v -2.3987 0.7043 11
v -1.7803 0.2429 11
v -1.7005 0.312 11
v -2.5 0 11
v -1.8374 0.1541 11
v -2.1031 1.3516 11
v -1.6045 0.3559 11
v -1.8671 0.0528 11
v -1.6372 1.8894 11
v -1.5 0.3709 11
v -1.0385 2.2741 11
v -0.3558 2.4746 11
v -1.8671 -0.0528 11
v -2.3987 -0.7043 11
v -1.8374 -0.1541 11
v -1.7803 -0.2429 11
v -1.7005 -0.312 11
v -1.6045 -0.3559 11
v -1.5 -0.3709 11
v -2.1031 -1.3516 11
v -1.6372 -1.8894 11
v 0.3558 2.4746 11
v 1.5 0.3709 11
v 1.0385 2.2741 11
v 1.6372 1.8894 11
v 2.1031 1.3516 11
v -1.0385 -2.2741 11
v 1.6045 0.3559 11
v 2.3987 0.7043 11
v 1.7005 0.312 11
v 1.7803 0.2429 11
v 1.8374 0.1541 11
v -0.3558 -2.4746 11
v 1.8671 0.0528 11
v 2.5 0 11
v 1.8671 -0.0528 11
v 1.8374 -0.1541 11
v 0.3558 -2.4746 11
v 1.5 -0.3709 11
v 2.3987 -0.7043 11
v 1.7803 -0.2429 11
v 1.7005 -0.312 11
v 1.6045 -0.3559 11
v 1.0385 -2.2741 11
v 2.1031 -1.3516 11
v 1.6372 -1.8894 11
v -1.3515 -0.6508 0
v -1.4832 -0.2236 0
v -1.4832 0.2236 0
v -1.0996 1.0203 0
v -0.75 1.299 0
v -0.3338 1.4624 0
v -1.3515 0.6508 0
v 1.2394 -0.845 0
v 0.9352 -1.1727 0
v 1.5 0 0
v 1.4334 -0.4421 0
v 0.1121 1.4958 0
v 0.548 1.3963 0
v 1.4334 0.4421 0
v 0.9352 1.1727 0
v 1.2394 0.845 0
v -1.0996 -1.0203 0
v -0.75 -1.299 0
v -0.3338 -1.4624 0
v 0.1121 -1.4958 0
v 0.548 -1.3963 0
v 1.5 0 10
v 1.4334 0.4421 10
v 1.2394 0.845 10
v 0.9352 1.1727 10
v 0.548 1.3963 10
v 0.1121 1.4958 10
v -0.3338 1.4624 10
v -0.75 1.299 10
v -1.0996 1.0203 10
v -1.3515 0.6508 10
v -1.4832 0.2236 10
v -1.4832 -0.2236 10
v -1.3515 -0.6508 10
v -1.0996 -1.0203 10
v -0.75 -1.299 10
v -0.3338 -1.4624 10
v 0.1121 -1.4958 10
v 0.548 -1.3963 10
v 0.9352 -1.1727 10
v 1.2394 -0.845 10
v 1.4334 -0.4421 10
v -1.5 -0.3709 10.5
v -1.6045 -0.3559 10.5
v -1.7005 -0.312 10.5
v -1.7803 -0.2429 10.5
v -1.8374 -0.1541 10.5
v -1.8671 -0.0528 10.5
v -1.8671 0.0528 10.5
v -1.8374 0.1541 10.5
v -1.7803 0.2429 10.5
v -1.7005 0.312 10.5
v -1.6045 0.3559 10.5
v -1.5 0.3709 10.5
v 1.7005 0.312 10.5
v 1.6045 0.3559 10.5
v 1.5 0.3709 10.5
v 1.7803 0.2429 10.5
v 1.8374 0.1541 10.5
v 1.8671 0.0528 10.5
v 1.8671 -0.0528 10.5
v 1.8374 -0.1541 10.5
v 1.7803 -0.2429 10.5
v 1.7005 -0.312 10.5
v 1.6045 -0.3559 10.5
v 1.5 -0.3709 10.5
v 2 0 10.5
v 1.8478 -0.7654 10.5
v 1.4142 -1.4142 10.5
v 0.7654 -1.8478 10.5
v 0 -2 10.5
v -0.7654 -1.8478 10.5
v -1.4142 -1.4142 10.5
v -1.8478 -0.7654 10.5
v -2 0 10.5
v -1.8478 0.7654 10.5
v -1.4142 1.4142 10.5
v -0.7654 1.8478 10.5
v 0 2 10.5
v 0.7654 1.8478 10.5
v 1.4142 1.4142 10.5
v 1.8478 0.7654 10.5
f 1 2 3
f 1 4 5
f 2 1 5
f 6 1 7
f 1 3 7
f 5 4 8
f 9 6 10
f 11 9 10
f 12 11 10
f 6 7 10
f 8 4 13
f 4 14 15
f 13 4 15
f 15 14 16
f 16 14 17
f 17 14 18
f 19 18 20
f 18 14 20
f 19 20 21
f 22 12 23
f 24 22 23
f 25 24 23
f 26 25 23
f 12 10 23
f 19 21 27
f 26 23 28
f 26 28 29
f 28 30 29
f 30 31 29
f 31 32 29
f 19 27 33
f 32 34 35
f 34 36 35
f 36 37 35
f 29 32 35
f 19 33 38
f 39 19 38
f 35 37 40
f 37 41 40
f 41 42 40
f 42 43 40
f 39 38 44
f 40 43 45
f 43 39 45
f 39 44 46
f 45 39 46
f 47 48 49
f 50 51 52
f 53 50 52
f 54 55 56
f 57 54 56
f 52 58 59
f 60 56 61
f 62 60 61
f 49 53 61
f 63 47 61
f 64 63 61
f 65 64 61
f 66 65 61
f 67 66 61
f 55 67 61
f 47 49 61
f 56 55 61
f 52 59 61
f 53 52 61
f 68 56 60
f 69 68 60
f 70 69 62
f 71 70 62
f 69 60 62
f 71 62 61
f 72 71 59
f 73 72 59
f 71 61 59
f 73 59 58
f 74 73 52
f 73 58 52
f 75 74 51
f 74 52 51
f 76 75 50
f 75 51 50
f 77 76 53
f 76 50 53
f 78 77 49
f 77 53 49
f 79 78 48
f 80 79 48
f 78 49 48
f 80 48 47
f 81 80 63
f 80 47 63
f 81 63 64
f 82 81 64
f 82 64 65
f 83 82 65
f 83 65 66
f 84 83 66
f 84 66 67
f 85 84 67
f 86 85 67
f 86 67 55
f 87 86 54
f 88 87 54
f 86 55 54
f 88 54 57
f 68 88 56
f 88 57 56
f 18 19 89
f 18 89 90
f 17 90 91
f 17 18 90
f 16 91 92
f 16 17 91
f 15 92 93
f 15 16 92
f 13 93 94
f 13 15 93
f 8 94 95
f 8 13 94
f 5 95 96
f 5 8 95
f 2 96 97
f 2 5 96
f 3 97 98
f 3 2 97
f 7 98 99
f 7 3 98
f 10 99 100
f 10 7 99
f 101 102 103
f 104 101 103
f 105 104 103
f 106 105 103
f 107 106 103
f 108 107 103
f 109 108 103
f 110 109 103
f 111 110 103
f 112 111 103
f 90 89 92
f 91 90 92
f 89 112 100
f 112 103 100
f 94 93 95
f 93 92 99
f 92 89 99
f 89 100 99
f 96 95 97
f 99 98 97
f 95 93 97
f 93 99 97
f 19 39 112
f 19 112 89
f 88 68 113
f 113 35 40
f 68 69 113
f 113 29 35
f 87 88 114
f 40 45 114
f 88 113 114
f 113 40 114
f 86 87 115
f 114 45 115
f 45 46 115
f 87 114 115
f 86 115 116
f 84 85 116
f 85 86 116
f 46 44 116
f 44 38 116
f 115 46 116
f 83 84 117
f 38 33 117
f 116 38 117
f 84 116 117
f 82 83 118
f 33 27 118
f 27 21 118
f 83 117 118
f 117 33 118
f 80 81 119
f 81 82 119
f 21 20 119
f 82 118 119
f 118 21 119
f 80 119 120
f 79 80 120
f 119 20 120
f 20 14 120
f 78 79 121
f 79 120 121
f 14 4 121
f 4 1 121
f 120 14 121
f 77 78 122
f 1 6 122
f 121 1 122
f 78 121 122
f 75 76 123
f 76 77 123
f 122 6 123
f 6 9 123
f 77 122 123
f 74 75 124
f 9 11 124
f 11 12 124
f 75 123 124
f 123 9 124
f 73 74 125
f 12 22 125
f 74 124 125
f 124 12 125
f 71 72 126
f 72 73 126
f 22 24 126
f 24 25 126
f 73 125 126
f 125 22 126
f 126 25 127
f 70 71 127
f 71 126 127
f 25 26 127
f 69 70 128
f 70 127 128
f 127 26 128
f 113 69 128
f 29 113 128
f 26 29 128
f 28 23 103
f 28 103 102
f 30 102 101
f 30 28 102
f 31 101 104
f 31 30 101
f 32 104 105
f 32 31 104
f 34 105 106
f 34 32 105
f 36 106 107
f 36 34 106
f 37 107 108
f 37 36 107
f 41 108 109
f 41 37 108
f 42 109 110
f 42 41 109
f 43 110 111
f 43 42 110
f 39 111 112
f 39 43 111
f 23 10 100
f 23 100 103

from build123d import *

# Parameters (mm, degrees)
SKETCH1_R           = 1.5
BOSS_EXTRUDE1_DEPTH = 10
CUT_EXTRUDE1_DEPTH  = 0.5


with BuildPart() as part:
    # Sketch1 → Boss-Extrude1 (new body)
    with BuildSketch(Plane.XY):
        Circle(SKETCH1_R)
    extrude(amount=BOSS_EXTRUDE1_DEPTH)

    # Sketch3 → Revolve1 (revolve)
    with BuildSketch(Plane(origin=(0, 0, 0), x_dir=(1, 0, 0), z_dir=(0, 1, 0)), mode=Mode.PRIVATE) as revolve1_sk:
        Polygon((-1.5, -10), (-2.5, -11), (0, -11), (0, -10), align=None)
    revolve(revolve1_sk.sketch.rotate(Axis((0, 0, 11), (0, 0, -1)), 180), axis=Axis((0, 0, 11), (0, 0, -1)))

    # Sketch4 → Cut-Extrude1 (cut)
    with BuildSketch(Plane.XY.offset(11)):
        with BuildLine():
            Line((-1.5, 0.37089394), (1.5, 0.37089394))
            ThreePointArc((1.5, 0.37089394), (1.87089394, 0), (1.5, -0.37089394))
            Line((1.5, -0.37089394), (-1.5, -0.37089394))
            ThreePointArc((-1.5, -0.37089394), (-1.87089394, 0), (-1.5, 0.37089394))
        make_face()
    extrude(amount=-CUT_EXTRUDE1_DEPTH, mode=Mode.SUBTRACT)


solid = part.part
